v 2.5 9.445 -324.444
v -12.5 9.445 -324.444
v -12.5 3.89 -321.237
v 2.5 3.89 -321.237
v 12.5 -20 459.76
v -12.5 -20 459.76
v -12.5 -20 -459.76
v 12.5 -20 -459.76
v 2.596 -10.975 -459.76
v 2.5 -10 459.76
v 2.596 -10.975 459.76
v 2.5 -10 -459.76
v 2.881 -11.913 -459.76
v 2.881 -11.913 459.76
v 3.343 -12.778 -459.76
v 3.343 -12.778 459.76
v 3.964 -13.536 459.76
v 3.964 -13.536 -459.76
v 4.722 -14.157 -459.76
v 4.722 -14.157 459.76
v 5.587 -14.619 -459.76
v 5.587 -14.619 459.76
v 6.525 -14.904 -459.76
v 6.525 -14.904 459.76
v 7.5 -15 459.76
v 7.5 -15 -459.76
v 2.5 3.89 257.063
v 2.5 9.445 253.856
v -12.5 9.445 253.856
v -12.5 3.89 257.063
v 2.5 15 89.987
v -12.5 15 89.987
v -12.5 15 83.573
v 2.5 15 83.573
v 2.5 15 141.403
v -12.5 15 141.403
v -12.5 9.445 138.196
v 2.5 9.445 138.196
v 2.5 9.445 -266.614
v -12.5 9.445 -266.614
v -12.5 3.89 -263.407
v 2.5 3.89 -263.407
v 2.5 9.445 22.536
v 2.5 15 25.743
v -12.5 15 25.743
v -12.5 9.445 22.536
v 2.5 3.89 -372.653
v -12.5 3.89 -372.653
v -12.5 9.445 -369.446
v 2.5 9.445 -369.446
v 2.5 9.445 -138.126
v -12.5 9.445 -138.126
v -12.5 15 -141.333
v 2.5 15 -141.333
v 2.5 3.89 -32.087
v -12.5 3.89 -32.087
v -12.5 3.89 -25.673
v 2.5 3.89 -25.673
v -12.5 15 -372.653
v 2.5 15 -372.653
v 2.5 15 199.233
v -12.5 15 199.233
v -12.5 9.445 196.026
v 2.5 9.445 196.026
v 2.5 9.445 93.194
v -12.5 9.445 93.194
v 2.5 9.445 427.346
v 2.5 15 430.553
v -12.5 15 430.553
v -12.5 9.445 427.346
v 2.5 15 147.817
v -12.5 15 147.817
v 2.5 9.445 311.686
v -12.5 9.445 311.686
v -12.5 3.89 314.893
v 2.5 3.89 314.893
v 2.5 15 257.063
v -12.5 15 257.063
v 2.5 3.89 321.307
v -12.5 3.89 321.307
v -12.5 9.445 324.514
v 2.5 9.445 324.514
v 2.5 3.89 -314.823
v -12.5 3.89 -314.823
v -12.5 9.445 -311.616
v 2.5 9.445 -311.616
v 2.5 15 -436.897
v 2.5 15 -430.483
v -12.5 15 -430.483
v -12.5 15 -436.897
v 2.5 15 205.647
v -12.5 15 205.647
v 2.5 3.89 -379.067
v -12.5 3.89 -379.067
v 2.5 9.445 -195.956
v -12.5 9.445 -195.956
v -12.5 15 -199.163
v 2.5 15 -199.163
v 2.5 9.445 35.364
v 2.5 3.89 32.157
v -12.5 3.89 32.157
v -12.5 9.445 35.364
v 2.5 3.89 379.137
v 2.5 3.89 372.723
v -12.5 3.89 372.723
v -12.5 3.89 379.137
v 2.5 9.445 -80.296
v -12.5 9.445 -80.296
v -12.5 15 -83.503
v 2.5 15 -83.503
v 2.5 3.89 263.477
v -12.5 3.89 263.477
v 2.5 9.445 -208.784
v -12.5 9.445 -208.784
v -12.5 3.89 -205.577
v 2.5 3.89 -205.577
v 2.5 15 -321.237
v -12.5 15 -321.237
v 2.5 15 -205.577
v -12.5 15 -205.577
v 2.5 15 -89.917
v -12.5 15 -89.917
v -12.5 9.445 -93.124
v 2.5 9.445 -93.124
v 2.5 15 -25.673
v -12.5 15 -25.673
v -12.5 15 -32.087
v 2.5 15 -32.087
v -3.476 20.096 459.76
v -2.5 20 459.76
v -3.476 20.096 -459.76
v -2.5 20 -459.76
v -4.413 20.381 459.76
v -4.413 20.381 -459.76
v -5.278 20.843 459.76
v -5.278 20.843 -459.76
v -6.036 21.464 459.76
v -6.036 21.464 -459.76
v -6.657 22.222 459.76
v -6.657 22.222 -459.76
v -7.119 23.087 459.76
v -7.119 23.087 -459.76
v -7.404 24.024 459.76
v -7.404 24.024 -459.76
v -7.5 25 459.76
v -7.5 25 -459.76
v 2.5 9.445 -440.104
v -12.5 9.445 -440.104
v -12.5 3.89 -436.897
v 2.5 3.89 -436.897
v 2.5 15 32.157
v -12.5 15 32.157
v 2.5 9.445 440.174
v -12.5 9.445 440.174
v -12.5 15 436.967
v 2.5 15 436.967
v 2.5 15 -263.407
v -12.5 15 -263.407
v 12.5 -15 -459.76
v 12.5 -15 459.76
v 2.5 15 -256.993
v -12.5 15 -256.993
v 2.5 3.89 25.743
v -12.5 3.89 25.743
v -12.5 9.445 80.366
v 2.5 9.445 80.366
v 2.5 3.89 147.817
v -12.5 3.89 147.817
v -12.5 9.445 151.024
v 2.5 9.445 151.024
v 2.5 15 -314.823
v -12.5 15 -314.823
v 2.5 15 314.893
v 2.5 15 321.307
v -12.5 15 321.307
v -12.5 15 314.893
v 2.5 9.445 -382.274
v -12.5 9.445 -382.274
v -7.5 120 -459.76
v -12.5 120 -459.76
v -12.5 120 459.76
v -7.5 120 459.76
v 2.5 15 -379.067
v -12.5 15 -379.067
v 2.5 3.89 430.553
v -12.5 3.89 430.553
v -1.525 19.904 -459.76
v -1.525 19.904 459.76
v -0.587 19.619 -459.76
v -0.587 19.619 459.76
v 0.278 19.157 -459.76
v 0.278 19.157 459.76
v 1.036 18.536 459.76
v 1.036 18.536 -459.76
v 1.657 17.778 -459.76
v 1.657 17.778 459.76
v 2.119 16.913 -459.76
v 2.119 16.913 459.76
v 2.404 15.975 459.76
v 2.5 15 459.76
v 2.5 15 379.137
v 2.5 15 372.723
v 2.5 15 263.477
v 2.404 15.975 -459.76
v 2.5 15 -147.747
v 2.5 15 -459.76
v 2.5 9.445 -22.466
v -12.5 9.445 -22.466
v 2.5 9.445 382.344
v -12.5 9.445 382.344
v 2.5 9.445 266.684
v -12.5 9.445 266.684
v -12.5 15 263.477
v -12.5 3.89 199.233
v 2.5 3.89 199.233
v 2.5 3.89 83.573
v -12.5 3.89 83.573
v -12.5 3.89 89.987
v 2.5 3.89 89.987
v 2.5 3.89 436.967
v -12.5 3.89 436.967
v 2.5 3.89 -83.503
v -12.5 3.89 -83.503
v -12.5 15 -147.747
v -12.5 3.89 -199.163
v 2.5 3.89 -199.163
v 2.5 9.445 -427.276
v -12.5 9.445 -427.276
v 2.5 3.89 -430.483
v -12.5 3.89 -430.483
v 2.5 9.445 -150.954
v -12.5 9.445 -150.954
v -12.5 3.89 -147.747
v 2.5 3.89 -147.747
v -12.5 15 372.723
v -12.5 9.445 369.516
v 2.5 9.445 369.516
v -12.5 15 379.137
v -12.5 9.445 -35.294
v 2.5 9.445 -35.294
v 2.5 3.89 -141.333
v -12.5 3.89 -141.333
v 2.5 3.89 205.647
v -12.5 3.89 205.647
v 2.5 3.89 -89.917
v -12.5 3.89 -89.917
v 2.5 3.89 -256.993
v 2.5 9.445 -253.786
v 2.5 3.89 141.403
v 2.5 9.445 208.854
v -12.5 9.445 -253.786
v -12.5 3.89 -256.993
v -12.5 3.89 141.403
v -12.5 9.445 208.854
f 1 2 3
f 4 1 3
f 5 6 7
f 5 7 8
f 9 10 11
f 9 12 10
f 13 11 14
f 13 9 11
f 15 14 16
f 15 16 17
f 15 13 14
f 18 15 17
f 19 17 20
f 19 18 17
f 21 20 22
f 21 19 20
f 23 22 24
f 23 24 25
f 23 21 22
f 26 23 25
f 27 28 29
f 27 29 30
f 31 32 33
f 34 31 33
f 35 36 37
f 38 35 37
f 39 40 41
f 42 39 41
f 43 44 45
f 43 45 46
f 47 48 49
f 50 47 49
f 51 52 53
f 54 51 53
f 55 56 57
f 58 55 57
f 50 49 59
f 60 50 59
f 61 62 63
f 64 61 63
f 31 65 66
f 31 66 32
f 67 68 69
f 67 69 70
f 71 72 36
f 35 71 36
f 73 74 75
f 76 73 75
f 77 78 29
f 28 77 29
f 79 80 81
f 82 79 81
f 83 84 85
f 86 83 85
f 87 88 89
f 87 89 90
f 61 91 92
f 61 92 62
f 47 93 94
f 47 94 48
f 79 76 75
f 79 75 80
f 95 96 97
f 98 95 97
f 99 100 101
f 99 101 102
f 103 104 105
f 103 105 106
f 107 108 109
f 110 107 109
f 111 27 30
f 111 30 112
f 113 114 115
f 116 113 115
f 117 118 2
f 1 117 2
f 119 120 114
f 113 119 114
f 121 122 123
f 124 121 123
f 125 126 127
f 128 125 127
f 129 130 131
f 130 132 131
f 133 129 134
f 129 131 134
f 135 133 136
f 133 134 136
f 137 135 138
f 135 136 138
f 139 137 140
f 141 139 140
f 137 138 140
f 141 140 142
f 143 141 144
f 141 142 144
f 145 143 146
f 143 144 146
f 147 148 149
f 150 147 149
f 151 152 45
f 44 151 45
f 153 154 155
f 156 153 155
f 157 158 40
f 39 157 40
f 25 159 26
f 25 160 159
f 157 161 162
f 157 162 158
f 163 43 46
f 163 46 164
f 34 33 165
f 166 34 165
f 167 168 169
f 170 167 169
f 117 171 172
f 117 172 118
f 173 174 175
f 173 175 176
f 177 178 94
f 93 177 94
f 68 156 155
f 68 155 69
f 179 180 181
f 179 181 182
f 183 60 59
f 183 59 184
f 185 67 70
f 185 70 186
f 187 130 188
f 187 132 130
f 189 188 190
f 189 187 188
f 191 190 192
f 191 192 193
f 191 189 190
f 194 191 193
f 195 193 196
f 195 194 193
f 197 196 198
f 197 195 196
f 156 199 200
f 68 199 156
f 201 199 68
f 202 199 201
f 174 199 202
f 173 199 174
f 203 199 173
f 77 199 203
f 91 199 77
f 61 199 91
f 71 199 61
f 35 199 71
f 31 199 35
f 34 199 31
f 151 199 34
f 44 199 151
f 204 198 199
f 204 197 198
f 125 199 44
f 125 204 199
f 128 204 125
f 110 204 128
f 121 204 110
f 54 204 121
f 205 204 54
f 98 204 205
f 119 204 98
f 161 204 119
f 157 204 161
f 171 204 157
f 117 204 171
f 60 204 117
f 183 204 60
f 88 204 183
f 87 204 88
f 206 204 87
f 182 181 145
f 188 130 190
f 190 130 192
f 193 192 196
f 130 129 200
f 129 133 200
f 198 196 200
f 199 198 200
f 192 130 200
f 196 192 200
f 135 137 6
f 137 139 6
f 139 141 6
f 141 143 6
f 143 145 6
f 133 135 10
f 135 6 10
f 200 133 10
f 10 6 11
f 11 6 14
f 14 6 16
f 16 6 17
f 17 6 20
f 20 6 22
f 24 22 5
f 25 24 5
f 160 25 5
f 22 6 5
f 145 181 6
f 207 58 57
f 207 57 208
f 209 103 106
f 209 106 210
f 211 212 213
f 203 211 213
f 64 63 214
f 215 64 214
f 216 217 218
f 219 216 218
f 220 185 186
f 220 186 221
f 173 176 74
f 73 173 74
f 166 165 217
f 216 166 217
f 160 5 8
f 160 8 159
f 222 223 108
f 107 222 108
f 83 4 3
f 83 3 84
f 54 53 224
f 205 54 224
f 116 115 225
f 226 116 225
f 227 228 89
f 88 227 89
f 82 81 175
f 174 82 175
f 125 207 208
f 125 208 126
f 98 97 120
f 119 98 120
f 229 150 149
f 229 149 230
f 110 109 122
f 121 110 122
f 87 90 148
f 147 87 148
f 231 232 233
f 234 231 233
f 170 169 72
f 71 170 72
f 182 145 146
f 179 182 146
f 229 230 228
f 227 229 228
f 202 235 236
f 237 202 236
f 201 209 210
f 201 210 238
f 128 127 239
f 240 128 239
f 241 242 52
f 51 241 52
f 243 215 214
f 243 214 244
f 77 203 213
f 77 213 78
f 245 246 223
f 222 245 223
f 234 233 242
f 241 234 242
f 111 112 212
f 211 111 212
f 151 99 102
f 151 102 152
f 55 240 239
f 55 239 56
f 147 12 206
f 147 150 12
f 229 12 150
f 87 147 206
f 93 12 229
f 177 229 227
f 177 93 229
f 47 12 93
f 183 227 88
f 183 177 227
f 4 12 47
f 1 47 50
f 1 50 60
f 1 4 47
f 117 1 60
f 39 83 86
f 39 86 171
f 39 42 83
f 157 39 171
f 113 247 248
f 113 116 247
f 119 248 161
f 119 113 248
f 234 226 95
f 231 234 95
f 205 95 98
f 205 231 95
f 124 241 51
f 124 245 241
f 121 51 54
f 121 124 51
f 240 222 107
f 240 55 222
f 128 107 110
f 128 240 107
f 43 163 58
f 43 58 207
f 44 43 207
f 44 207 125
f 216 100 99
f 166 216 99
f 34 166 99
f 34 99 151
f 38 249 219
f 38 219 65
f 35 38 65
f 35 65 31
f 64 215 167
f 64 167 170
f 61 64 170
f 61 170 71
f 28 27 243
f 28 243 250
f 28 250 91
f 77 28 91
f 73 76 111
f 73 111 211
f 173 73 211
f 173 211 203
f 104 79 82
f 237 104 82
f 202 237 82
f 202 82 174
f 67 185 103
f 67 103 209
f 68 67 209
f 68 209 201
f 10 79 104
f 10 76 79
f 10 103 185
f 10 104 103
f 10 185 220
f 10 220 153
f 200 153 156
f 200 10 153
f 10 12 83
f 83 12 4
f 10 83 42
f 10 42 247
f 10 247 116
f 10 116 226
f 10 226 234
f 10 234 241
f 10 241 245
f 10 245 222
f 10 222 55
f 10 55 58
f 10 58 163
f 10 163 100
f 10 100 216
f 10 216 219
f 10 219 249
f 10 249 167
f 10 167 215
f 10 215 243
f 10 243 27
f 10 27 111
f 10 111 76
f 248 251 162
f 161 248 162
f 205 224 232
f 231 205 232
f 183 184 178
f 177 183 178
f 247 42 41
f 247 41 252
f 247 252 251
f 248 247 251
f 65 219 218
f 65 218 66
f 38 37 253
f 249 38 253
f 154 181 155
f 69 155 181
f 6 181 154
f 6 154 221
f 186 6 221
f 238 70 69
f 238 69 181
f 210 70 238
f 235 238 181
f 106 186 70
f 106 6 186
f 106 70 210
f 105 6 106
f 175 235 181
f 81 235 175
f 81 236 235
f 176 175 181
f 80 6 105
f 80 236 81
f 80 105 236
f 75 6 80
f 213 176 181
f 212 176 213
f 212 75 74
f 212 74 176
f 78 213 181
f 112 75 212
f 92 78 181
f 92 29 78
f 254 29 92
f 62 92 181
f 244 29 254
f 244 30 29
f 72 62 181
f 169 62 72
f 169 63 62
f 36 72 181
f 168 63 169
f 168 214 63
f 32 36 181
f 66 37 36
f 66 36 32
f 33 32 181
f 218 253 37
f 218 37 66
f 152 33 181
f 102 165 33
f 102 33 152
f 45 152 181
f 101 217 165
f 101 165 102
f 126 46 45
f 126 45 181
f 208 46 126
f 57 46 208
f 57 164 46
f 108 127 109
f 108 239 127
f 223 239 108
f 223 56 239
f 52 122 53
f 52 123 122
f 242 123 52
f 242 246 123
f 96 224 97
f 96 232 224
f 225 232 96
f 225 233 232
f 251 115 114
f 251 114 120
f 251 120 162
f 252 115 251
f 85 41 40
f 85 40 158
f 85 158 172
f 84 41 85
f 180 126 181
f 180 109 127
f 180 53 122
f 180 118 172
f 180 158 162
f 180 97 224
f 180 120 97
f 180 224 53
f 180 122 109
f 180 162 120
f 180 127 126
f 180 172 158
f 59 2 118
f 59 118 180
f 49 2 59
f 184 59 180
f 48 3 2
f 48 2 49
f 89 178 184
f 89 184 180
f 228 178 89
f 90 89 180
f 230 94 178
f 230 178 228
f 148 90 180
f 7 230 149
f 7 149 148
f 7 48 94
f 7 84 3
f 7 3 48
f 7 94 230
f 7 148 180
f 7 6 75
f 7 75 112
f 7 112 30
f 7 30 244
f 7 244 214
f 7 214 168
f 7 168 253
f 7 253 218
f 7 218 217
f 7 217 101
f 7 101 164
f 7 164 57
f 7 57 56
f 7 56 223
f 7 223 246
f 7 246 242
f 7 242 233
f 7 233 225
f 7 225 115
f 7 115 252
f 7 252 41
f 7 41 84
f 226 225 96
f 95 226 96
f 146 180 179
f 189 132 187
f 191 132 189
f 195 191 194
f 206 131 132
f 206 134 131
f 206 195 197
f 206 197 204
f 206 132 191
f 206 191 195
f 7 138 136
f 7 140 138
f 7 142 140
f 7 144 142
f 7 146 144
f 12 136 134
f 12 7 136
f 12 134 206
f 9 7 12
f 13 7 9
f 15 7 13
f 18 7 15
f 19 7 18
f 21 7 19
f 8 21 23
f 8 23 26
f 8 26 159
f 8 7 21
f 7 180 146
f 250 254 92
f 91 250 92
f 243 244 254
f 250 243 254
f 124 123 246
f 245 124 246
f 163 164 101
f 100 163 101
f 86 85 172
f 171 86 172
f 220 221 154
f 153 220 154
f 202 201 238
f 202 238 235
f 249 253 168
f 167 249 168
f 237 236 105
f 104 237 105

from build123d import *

# Parameters (mm, degrees)
GENERAL_EXTRUDE_DEPTH       = 459.76
ROUNDING_R                  = 5
ROLLER_HOLDERS_DEPTH        = 461.873363952
SKETCH5_W                   = 5
SKETCH5_H                   = 919.52
GUARD_RAIL_DEPTH            = 100
GUARD_RAIL_SUPPORT_FILLET_R = 5


with BuildPart() as part:
    # Sketch2 → General extrude (new, symmetric)
    with BuildSketch(Plane.XY):
        Polygon((-12.5, 20), (-12.5, -20), (12.5, -20), (12.5, -15), (2.5, -15), (2.5, 20), align=None)
    extrude(amount=GENERAL_EXTRUDE_DEPTH, both=True)

    # Rounding
    rounding_edges = [part.edges().sort_by_distance(p)[0] for p in [
        (2.5, 20, 0),
        (2.5, -15, 0),
    ]]
    fillet(rounding_edges, radius=ROUNDING_R)

    # Sketch3 → Roller holders (cut, through all)
    with BuildSketch(Plane.ZY.offset(12.5)):
        Polygon((436.967180745, 3.89), (440.174361491, 9.445), (436.967180745, 15), (430.552819255, 15), (427.345638509, 9.445), (430.552819255, 3.89), align=None)
        Polygon((379.137180745, 3.89), (382.344361491, 9.445), (379.137180745, 15), (372.722819255, 15), (369.515638509, 9.445), (372.722819255, 3.89), align=None)
        Polygon((321.307180745, 3.89), (324.514361491, 9.445), (321.307180745, 15), (314.892819255, 15), (311.685638509, 9.445), (314.892819255, 3.89), align=None)
        Polygon((263.477180745, 3.89), (266.684361491, 9.445), (263.477180745, 15), (257.062819255, 15), (253.855638509, 9.445), (257.062819255, 3.89), align=None)
        Polygon((205.647180745, 3.89), (208.854361491, 9.445), (205.647180745, 15), (199.232819255, 15), (196.025638509, 9.445), (199.232819255, 3.89), align=None)
        Polygon((147.817180745, 3.89), (151.024361491, 9.445), (147.817180745, 15), (141.402819255, 15), (138.195638509, 9.445), (141.402819255, 3.89), align=None)
        Polygon((89.987180745, 3.89), (93.194361491, 9.445), (89.987180745, 15), (83.572819255, 15), (80.365638509, 9.445), (83.572819255, 3.89), align=None)
        Polygon((32.157180745, 3.89), (35.364361491, 9.445), (32.157180745, 15), (25.742819255, 15), (22.535638509, 9.445), (25.742819255, 3.89), align=None)
        Polygon((-25.672819255, 3.89), (-22.465638509, 9.445), (-25.672819255, 15), (-32.087180745, 15), (-35.294361491, 9.445), (-32.087180745, 3.89), align=None)
        Polygon((-83.502819255, 3.89), (-80.295638509, 9.445), (-83.502819255, 15), (-89.917180745, 15), (-93.124361491, 9.445), (-89.917180745, 3.89), align=None)
        Polygon((-141.332819255, 3.89), (-138.125638509, 9.445), (-141.332819255, 15), (-147.747180745, 15), (-150.954361491, 9.445), (-147.747180745, 3.89), align=None)
        Polygon((-199.162819255, 3.89), (-195.955638509, 9.445), (-199.162819255, 15), (-205.577180745, 15), (-208.784361491, 9.445), (-205.577180745, 3.89), align=None)
        Polygon((-256.992819255, 3.89), (-253.785638509, 9.445), (-256.992819255, 15), (-263.407180745, 15), (-266.614361491, 9.445), (-263.407180745, 3.89), align=None)
        Polygon((-314.822819255, 3.89), (-311.615638509, 9.445), (-314.822819255, 15), (-321.237180745, 15), (-324.444361491, 9.445), (-321.237180745, 3.89), align=None)
        Polygon((-372.652819255, 3.89), (-369.445638509, 9.445), (-372.652819255, 15), (-379.067180745, 15), (-382.274361491, 9.445), (-379.067180745, 3.89), align=None)
        Polygon((-430.482819255, 3.89), (-427.275638509, 9.445), (-430.482819255, 15), (-436.897180745, 15), (-440.104361491, 9.445), (-436.897180745, 3.89), align=None)
    extrude(amount=-ROLLER_HOLDERS_DEPTH, mode=Mode.SUBTRACT)

    # Sketch5 → Guard rail (add)
    with BuildSketch(Plane(origin=(0, 20, 0), x_dir=(1, 0, 0), z_dir=(0, 1, 0))):
        with Locations((-10, 0)):
            Rectangle(SKETCH5_W, SKETCH5_H)
    extrude(amount=GUARD_RAIL_DEPTH)

    # Guard rail support fillet
    guard_rail_support_fillet_edges = [part.edges().sort_by_distance(p)[0] for p in [
        (-7.5, 20, 0),
    ]]
    fillet(guard_rail_support_fillet_edges, radius=GUARD_RAIL_SUPPORT_FILLET_R - 0.0001)  # a hair under: the kernel refuses the full size


solid = part.part
